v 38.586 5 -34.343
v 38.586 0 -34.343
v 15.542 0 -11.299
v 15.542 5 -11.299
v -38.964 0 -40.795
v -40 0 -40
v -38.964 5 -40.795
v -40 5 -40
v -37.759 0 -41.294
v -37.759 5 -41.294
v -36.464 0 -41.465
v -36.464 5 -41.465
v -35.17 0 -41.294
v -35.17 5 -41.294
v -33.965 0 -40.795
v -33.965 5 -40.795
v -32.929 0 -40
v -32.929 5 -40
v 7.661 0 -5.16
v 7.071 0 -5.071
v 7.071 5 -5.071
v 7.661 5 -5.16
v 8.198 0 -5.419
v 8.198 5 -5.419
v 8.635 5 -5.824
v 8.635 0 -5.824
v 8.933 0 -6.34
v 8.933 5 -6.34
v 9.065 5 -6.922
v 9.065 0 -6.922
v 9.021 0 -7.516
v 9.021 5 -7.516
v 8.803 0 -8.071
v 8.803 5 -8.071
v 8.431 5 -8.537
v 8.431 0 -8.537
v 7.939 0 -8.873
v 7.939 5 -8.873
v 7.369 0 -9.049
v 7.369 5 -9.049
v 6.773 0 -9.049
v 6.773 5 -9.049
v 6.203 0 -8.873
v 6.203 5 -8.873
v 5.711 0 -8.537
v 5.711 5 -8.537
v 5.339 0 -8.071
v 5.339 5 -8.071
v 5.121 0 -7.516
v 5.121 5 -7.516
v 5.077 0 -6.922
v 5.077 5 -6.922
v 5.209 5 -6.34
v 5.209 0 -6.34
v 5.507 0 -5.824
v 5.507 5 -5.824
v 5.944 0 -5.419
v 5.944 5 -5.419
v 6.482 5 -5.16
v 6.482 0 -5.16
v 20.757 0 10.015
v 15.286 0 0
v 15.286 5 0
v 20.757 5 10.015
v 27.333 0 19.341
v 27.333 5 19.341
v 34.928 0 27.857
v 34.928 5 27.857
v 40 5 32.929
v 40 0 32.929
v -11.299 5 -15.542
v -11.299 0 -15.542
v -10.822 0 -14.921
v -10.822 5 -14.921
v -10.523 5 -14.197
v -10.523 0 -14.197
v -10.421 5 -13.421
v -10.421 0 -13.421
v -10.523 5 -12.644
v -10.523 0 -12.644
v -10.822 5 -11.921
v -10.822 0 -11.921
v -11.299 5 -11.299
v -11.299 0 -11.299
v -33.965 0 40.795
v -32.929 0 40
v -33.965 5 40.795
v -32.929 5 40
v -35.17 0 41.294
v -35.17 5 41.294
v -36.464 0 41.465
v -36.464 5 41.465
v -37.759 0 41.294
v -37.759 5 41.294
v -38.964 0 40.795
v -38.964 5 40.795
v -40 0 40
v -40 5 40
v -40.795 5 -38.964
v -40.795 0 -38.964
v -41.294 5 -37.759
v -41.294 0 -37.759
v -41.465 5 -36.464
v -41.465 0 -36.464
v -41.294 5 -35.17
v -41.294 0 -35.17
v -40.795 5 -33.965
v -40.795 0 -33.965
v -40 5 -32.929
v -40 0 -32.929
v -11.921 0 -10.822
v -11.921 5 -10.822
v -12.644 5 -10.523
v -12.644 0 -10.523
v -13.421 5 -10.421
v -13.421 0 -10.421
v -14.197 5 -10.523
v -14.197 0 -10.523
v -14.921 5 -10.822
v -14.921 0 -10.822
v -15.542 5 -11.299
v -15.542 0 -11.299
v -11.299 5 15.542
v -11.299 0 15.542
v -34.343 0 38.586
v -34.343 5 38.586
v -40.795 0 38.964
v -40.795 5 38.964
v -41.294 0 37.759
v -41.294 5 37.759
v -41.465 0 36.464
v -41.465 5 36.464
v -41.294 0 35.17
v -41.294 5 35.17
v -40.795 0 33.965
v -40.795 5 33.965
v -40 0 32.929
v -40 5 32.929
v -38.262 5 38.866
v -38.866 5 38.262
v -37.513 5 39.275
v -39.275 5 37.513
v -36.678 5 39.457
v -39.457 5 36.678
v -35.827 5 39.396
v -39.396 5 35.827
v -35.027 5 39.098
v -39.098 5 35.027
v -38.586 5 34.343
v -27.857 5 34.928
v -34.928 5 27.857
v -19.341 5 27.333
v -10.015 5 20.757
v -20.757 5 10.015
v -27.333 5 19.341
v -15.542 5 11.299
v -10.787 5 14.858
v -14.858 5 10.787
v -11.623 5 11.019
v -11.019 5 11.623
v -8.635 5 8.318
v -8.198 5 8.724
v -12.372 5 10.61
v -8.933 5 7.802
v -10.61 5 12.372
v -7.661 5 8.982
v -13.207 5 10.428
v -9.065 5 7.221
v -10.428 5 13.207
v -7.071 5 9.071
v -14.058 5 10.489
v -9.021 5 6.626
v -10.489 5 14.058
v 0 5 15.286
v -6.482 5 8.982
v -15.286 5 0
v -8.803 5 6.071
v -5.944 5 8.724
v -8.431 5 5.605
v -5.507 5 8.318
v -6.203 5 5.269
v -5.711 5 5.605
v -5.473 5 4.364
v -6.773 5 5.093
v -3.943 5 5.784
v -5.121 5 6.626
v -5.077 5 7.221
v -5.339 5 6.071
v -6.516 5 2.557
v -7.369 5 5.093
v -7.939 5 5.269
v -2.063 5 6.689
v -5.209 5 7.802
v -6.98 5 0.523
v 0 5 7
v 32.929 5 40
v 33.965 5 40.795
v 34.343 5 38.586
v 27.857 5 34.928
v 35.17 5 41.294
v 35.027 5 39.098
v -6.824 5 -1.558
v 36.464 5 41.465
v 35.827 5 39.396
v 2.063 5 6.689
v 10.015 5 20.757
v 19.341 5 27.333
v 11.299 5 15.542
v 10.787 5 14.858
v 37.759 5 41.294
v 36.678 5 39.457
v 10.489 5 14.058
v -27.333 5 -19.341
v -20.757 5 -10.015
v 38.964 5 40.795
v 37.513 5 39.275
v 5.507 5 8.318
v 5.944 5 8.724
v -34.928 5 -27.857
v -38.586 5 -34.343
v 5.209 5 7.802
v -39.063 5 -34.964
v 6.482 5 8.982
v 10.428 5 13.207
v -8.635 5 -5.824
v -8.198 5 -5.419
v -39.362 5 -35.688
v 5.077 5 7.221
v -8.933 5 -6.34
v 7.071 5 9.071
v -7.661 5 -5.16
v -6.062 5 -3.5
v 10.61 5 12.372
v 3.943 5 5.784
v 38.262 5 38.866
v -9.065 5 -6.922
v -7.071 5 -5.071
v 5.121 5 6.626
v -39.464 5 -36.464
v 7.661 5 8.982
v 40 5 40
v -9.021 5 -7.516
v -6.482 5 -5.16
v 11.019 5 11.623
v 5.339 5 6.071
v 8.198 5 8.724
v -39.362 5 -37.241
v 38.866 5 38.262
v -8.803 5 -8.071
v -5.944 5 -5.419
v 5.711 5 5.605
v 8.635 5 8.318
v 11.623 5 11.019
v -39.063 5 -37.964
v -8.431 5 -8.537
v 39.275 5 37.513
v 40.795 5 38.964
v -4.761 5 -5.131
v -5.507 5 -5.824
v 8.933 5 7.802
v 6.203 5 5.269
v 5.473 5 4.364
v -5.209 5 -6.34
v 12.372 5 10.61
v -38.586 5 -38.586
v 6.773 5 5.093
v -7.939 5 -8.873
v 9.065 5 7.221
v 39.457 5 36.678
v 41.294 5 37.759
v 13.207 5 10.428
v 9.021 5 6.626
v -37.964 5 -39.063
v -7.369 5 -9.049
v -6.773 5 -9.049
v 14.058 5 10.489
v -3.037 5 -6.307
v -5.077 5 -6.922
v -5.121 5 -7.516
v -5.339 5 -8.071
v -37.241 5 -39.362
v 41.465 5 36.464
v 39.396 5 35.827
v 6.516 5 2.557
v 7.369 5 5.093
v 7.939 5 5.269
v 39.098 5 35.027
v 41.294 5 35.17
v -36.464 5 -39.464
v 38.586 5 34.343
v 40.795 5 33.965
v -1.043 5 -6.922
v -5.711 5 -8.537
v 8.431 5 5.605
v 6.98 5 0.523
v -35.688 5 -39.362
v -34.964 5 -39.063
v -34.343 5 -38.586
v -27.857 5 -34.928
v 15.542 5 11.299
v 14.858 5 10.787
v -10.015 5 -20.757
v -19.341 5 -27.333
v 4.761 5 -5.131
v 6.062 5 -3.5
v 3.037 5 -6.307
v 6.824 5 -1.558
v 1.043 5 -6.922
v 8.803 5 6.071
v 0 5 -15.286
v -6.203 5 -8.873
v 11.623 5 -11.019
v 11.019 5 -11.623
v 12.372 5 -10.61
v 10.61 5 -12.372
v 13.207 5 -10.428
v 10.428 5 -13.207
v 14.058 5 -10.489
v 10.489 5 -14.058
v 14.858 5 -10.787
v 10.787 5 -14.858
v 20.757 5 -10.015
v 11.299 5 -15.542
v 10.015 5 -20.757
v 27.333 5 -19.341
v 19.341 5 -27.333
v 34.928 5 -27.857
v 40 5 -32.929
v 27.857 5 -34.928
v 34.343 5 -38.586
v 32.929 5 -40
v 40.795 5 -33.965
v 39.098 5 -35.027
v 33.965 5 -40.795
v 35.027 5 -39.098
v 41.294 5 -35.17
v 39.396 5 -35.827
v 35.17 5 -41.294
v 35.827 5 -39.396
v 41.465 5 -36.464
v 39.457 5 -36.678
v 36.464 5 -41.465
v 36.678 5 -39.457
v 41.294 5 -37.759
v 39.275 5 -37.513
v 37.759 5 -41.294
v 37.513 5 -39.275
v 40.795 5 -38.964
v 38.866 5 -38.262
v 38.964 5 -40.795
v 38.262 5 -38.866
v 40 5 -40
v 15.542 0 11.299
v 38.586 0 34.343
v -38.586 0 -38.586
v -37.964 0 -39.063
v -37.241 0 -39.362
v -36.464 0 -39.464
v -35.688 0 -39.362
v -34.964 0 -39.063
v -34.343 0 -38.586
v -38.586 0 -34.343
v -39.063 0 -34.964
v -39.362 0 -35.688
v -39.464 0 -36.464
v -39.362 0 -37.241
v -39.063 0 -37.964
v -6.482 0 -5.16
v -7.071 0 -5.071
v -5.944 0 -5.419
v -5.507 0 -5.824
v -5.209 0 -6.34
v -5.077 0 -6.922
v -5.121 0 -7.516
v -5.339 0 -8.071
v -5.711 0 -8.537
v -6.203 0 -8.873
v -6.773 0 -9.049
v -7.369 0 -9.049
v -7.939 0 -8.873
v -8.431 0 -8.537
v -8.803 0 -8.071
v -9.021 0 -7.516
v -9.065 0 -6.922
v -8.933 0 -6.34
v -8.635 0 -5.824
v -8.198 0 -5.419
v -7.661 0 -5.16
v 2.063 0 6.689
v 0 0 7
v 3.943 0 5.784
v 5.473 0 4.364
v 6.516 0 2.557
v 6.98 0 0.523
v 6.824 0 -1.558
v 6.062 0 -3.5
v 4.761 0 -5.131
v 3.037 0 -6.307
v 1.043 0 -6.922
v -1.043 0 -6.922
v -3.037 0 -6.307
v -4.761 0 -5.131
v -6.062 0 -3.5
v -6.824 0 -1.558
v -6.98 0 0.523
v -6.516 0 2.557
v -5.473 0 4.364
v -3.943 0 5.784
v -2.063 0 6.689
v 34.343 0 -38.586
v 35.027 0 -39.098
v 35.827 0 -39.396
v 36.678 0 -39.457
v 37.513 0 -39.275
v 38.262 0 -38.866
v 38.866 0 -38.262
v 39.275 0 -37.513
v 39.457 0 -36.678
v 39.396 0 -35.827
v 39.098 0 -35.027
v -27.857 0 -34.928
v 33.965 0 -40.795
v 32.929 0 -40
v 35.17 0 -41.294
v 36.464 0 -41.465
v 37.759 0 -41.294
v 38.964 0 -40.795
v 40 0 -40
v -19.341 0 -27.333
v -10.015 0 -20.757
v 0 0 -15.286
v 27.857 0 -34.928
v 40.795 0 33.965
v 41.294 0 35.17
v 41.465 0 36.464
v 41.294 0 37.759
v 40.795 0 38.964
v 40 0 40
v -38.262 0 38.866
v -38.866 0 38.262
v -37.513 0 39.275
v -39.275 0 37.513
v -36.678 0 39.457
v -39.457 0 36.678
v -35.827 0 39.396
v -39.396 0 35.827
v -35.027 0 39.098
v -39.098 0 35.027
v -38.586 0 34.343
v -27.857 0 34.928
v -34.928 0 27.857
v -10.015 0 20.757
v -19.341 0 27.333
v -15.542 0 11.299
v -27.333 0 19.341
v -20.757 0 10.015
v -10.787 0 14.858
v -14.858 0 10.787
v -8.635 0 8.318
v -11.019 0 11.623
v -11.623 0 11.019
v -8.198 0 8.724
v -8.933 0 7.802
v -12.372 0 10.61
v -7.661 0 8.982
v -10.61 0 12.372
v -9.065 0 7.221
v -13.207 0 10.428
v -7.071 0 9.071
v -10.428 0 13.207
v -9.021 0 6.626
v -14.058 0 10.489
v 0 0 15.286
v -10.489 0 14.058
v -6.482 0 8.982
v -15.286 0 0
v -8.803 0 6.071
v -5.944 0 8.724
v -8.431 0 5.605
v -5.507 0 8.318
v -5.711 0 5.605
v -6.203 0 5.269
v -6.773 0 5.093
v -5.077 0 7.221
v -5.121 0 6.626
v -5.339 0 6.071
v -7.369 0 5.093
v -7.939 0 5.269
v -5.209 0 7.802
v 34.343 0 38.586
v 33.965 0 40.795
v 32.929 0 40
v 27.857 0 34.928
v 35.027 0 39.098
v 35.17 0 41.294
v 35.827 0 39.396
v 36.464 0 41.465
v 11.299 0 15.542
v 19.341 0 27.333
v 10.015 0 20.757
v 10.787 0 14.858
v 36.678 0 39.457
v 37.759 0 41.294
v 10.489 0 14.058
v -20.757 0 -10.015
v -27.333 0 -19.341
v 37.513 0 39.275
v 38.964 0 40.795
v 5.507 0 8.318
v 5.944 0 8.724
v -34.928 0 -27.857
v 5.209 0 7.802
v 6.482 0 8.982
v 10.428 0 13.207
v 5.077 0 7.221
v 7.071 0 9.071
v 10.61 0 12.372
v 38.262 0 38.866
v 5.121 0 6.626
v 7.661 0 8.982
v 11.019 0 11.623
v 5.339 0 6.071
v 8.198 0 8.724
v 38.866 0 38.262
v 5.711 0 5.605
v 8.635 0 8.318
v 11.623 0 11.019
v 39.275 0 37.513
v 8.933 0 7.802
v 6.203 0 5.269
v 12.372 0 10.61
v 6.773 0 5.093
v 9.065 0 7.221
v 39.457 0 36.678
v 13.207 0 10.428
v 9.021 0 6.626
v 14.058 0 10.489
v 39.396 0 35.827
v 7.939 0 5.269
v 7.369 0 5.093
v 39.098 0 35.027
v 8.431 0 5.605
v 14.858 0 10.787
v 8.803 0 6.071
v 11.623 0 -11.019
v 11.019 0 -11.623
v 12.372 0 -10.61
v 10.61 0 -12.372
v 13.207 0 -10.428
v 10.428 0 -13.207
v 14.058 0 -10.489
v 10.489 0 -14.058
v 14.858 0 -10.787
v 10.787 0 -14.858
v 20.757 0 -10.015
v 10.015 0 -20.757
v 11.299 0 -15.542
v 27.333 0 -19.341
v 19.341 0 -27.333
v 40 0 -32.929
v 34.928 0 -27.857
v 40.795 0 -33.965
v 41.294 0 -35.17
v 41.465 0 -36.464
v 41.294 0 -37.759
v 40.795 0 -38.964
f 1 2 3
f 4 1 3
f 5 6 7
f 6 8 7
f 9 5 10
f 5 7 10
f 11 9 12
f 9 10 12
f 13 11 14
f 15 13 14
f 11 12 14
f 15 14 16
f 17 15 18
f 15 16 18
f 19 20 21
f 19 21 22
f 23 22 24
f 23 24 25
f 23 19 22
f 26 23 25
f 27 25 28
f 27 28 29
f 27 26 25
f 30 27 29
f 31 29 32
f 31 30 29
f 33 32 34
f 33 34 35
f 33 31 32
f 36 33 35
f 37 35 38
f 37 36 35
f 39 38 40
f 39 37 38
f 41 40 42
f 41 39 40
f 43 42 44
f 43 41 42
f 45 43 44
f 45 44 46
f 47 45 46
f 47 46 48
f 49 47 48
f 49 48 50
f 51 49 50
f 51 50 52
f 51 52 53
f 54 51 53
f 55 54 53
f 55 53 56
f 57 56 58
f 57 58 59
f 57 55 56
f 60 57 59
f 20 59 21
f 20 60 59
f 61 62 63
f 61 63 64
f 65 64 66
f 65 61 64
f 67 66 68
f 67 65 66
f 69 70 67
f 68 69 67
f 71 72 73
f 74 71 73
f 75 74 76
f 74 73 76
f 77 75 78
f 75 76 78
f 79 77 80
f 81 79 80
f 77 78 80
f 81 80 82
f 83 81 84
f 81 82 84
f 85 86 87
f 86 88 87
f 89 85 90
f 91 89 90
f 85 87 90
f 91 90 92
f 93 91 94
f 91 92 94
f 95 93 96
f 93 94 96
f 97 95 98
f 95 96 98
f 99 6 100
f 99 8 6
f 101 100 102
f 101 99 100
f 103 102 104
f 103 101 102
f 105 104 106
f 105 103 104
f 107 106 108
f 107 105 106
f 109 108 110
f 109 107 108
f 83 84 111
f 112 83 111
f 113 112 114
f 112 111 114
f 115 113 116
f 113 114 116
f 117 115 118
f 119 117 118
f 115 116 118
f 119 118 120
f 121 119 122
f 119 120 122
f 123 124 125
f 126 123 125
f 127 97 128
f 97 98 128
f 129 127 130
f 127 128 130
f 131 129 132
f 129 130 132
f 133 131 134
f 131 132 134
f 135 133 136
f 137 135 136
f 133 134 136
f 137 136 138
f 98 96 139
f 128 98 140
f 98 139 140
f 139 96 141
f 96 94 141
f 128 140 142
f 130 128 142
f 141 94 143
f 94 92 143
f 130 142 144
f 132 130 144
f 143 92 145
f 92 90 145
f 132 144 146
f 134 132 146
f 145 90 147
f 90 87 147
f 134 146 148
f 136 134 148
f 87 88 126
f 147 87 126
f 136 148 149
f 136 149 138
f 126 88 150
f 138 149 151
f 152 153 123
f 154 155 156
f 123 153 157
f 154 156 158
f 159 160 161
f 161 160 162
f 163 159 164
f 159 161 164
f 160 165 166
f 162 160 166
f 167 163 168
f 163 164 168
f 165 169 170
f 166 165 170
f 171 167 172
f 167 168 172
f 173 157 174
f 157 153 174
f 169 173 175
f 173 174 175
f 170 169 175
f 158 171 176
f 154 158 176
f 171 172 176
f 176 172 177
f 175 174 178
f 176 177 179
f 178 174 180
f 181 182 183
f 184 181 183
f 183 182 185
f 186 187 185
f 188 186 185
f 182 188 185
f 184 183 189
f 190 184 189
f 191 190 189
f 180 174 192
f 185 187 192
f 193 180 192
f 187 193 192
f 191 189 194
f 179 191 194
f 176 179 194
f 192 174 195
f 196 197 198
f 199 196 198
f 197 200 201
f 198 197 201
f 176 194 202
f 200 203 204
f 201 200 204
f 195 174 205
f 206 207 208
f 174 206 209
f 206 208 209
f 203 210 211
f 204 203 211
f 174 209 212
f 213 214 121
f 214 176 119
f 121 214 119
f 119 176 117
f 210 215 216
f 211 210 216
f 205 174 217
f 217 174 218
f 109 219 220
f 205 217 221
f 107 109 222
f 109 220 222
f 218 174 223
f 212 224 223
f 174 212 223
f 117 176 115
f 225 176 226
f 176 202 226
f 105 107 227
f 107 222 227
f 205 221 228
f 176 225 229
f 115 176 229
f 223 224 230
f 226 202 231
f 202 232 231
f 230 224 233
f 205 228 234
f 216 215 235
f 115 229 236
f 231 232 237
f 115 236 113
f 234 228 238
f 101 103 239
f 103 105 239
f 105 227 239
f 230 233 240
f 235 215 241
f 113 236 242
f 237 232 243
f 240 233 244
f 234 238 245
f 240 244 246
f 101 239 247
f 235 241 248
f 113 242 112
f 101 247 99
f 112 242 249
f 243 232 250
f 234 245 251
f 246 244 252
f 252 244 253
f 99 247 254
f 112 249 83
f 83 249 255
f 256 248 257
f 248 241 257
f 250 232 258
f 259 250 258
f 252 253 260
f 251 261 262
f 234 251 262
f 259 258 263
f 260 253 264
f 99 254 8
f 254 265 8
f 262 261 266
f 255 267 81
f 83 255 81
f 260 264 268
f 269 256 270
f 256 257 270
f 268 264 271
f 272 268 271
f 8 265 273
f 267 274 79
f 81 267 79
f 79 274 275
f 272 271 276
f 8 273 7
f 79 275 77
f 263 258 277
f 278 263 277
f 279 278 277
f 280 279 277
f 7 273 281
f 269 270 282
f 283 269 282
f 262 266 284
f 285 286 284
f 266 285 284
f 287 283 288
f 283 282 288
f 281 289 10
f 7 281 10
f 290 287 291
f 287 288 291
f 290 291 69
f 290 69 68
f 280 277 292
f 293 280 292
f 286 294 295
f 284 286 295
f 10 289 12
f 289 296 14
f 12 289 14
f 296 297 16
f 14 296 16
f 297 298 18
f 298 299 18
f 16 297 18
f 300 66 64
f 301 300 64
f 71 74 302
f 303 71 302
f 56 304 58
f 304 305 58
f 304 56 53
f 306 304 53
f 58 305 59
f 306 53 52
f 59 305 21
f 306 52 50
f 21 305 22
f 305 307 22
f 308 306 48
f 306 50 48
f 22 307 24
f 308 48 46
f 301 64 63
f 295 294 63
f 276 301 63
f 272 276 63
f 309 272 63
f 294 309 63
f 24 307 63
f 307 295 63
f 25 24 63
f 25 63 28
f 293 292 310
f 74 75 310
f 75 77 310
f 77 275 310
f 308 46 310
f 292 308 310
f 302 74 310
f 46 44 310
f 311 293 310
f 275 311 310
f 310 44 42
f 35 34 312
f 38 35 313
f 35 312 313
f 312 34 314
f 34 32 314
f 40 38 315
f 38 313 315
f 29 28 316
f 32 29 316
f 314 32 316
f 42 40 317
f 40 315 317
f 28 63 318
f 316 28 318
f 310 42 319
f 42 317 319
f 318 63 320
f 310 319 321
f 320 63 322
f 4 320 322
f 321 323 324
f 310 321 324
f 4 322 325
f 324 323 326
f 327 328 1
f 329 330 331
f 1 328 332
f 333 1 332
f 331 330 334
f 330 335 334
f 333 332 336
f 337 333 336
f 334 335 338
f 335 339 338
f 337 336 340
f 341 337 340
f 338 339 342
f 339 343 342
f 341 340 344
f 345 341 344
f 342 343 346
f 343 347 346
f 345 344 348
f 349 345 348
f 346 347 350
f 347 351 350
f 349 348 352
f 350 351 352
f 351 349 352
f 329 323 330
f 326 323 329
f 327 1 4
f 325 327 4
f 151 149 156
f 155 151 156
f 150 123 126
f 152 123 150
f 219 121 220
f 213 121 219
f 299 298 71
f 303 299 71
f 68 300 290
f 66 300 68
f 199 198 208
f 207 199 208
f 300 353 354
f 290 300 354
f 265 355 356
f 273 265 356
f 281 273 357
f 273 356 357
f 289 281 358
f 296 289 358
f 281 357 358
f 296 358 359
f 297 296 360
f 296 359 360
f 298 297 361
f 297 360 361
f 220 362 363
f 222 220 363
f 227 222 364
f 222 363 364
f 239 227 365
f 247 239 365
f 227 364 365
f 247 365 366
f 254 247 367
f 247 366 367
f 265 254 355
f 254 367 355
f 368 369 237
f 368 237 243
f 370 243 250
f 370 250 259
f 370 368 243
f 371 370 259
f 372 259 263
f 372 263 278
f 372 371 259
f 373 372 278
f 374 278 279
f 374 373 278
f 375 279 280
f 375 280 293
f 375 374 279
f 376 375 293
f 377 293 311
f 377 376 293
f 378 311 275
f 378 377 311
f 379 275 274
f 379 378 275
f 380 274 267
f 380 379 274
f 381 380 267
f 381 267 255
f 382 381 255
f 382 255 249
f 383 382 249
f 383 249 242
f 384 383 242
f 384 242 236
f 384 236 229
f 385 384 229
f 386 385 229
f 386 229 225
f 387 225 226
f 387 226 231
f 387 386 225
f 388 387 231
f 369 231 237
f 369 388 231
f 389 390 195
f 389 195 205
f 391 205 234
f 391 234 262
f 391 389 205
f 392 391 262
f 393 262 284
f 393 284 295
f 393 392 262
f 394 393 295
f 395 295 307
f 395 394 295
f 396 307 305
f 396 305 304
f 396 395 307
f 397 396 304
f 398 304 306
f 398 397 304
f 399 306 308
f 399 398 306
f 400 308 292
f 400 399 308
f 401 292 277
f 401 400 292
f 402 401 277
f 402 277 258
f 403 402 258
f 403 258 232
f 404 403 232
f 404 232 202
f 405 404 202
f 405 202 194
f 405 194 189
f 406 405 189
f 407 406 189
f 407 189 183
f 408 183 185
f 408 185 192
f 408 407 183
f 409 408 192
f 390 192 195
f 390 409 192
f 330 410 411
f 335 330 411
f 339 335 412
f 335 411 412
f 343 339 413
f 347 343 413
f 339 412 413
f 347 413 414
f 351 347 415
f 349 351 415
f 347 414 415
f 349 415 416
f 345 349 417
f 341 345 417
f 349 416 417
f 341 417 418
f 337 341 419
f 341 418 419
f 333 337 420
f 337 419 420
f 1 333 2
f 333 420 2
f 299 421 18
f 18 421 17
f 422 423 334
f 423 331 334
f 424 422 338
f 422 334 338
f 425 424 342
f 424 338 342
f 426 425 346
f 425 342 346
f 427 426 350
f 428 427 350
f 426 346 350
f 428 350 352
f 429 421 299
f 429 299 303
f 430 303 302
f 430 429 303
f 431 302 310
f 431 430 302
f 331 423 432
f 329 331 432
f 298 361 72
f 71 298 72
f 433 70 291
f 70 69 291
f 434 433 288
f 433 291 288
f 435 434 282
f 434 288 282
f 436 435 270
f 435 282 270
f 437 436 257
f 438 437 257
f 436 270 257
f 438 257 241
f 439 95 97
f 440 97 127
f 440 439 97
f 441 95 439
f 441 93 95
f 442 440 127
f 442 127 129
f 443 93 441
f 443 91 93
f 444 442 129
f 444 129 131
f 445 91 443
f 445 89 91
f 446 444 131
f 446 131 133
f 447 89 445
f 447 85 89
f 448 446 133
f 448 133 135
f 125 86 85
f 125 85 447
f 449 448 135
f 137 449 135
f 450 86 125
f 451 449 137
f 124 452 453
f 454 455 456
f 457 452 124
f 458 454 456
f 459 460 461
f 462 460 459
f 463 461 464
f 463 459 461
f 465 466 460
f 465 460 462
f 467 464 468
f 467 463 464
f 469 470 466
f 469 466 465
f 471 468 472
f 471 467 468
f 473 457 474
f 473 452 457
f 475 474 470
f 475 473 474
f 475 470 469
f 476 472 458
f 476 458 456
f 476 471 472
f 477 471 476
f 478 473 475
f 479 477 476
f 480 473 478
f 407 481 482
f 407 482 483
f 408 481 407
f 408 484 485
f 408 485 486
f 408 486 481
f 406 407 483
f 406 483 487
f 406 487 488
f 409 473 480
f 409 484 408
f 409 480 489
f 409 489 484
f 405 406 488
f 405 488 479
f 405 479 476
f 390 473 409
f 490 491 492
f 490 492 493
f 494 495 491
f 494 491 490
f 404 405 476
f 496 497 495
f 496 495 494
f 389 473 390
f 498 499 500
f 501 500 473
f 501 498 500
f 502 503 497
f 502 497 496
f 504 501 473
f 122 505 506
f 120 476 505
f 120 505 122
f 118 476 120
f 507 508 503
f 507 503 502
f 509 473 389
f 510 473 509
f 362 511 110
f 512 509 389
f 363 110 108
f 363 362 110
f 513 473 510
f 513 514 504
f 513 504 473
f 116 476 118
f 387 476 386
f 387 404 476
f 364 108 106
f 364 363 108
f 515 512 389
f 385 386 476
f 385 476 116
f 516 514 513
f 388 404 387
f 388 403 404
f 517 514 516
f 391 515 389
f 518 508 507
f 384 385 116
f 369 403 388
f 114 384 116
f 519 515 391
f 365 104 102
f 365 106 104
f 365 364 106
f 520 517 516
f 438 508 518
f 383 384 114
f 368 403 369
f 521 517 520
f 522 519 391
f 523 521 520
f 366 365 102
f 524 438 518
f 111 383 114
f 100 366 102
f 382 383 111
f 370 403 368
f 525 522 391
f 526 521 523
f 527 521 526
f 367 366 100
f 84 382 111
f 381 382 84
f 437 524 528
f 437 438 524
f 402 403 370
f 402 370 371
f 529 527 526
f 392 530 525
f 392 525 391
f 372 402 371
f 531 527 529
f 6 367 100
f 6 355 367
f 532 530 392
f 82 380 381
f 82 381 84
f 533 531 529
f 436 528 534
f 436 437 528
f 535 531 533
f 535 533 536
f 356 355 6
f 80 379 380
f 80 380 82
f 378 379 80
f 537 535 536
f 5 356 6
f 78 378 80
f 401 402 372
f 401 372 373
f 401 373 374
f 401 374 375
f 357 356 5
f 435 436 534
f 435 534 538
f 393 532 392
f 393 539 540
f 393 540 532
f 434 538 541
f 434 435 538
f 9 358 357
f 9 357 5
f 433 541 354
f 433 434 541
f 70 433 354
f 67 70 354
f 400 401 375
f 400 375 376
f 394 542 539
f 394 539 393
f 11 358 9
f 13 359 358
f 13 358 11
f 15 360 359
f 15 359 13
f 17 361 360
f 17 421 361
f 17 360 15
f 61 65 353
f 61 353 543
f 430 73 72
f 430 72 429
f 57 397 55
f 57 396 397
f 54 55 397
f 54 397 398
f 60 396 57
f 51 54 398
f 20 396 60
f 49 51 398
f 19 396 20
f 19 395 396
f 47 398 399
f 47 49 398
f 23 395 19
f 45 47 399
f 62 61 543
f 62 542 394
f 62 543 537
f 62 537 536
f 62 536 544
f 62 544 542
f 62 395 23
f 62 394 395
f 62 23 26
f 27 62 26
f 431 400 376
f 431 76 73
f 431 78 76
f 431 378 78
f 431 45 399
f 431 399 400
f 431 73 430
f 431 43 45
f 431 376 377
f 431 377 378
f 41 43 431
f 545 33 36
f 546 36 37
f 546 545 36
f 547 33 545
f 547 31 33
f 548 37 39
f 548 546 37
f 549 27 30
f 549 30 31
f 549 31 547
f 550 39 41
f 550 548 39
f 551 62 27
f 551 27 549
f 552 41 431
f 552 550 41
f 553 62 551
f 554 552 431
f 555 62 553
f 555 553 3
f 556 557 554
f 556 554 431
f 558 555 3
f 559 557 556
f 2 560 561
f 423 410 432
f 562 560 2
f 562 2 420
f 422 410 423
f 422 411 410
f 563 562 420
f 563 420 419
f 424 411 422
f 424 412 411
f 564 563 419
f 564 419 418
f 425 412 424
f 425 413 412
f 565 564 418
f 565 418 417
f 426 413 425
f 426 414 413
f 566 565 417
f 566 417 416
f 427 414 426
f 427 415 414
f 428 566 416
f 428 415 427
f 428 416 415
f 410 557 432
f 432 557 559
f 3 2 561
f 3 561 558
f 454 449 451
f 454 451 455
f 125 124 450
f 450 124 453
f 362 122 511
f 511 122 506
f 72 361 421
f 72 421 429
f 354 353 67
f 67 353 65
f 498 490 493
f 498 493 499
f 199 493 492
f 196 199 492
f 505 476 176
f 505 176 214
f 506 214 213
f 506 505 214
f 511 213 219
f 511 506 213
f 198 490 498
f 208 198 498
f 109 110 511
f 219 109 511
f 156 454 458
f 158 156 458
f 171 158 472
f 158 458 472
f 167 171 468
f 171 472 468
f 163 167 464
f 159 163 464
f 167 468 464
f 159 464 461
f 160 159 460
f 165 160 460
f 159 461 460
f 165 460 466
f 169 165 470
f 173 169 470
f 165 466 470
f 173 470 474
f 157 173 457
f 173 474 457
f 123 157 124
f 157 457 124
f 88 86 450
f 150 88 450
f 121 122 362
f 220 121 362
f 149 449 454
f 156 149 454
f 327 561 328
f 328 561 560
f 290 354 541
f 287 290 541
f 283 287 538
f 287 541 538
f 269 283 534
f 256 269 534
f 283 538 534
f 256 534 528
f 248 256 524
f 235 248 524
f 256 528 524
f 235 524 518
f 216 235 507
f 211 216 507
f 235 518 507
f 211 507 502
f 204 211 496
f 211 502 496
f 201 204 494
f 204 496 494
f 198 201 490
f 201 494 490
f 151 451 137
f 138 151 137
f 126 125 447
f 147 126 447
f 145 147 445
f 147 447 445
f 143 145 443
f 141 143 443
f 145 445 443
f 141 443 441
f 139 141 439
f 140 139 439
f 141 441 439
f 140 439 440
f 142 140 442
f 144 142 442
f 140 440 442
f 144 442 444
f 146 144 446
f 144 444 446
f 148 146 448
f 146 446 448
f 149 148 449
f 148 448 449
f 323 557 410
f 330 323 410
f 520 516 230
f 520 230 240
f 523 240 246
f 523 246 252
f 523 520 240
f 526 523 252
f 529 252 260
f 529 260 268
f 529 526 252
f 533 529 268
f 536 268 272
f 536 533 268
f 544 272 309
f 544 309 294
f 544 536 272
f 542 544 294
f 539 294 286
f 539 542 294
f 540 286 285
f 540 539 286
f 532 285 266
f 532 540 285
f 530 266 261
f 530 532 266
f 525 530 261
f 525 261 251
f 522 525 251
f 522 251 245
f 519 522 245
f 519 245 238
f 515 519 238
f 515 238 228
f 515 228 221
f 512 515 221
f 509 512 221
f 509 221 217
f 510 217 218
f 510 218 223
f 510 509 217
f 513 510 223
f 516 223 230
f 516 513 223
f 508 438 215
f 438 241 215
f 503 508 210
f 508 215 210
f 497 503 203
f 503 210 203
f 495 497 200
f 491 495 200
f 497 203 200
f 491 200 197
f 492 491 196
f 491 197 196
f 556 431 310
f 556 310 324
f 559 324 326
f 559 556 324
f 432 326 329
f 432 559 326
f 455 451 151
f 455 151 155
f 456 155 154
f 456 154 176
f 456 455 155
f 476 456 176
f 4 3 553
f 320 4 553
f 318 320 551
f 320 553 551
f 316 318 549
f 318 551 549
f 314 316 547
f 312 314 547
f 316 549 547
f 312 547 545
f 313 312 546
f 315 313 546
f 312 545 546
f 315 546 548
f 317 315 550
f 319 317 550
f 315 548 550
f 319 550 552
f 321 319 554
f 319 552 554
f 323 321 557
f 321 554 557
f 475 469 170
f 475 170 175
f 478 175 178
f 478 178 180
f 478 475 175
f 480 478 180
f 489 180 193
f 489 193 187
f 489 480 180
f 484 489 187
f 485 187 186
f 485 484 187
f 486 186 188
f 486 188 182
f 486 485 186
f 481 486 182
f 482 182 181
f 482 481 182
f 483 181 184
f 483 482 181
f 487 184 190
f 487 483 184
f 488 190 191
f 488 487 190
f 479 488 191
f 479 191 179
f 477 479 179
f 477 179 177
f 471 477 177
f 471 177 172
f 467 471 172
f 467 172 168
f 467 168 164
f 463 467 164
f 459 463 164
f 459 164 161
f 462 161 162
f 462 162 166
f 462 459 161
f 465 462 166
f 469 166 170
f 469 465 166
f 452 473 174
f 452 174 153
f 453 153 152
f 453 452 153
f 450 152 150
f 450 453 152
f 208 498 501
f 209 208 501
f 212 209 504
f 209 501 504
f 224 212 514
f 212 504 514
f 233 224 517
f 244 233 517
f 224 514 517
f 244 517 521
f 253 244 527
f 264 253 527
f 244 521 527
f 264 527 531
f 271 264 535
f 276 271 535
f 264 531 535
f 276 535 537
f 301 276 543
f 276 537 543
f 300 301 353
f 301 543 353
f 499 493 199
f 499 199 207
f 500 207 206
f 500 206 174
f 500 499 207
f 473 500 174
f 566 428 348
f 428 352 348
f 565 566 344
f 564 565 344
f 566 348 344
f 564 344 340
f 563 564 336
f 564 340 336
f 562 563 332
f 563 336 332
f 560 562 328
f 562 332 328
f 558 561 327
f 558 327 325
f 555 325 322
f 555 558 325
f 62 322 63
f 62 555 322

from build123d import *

# Parameters (mm, degrees)
SKETCH1_R           = 14
SKETCH1_R_2         = 2
SKETCH1_R_3         = 7
BOSS_EXTRUDE1_DEPTH = 5
BOSS_EXTRUDE3_START = -5
BOSS_EXTRUDE3_DEPTH = 5
FILLET1_R           = 5
FILLET2_R           = 100


# Some blends are built 0.0001 mm under size
with BuildPart() as part:
    # Sketch1 → Boss-Extrude1 (new body)
    with BuildSketch(Plane(origin=(0, 0, 0), x_dir=(1, 0, 0), z_dir=(0, 1, 0))):
        with Locations(Location((0, 0, 0), (0, 0, 270))):
            Circle(SKETCH1_R)
        with Locations(Location((7.071067812, 7.071067812, 0), (0, 0, 270))):
            Circle(SKETCH1_R_2, mode=Mode.SUBTRACT)
        with Locations(Location((7.071067812, -7.071067812, 0), (0, 0, 270))):
            Circle(SKETCH1_R_2, mode=Mode.SUBTRACT)
        with Locations(Location((-7.071067812, -7.071067812, 0), (0, 0, 270))):
            Circle(SKETCH1_R_2, mode=Mode.SUBTRACT)
        with Locations(Location((-7.071067812, 7.071067812, 0), (0, 0, 270))):
            Circle(SKETCH1_R_2, mode=Mode.SUBTRACT)
        with Locations(Location((0, 0, 0), (0, 0, 270))):
            Circle(SKETCH1_R_3, mode=Mode.SUBTRACT)
    extrude(amount=BOSS_EXTRUDE1_DEPTH)

    # Sketch4 → Boss-Extrude3 (add)
    # profile 1 of 7: a face of its own
    with BuildSketch(Plane(origin=(0, 5, 0), x_dir=(1, 0, 0), z_dir=(0, 1, 0)).offset(BOSS_EXTRUDE3_START)):
        with BuildLine():
            ThreePointArc((-5.711087099, -12.78215491), (-7.937253933, -11.532562595), (-9.899494937, -9.899494937))
            ThreePointArc((-9.899494937, -9.899494937), (-11.532562595, -7.937253933), (-12.78215491, -5.711087099))
            Line((-12.78215491, -5.711087099), (-43.535533906, -36.464466094))
            Line((-43.535533906, -36.464466094), (-36.464466094, -43.535533906))
            Line((-36.464466094, -43.535533906), (-5.711087099, -12.78215491))
        make_face()
        with BuildLine():
            ThreePointArc((-15.541841567, -11.29920088), (-11.29920088, -11.29920088), (-11.29920088, -15.541841567))
            Line((-11.29920088, -15.541841567), (-34.343145751, -38.585786438))
            ThreePointArc((-34.343145751, -38.585786438), (-38.585786438, -38.585786438), (-38.585786438, -34.343145751))
            Line((-38.585786438, -34.343145751), (-15.541841567, -11.29920088))
        make_face(mode=Mode.SUBTRACT)
    # profile 2 of 7: a face of its own
    with BuildSketch(Plane(origin=(0, 5, 0), x_dir=(1, 0, 0), z_dir=(0, 1, 0)).offset(BOSS_EXTRUDE3_START)):
        with BuildLine():
            ThreePointArc((-10.420735139, 9.349239497), (-10.163839474, 9.627895261), (-9.899494937, 9.899494937))
            Line((-9.899494937, 9.899494937), (-11.29920088, 11.29920088))
            ThreePointArc((-11.29920088, 11.29920088), (-13.420521224, 10.420521224), (-15.541841567, 11.29920088))
            Line((-15.541841567, 11.29920088), (-38.585786438, 34.343145751))
            ThreePointArc((-38.585786438, 34.343145751), (-39.464466094, 36.464466094), (-38.585786438, 38.585786438))
            Line((-38.585786438, 38.585786438), (-40, 40))
            Line((-40, 40), (-43.535533906, 36.464466094))
            Line((-43.535533906, 36.464466094), (-13.420521224, 6.349453412))
            Line((-13.420521224, 6.349453412), (-10.420735139, 9.349239497))
        make_face()
    # profile 3 of 7: a face of its own
    with BuildSketch(Plane(origin=(0, 5, 0), x_dir=(1, 0, 0), z_dir=(0, 1, 0)).offset(BOSS_EXTRUDE3_START)):
        with BuildLine():
            ThreePointArc((-12.78215491, 5.711087099), (-11.743192278, 7.622167351), (-10.420735139, 9.349239497))
            Line((-10.420735139, 9.349239497), (-13.420521224, 6.349453412))
            Line((-13.420521224, 6.349453412), (-12.78215491, 5.711087099))
        make_face()
    # profile 4 of 7: a face of its own
    with BuildSketch(Plane(origin=(0, 5, 0), x_dir=(1, 0, 0), z_dir=(0, 1, 0)).offset(BOSS_EXTRUDE3_START)):
        with BuildLine():
            Line((-11.29920088, 11.29920088), (-9.899494937, 9.899494937))
            ThreePointArc((-9.899494937, 9.899494937), (-9.627895261, 10.163839474), (-9.349239497, 10.420735139))
            Line((-9.349239497, 10.420735139), (-6.349453412, 13.420521224))
            Line((-6.349453412, 13.420521224), (-36.464466094, 43.535533906))
            Line((-36.464466094, 43.535533906), (-40, 40))
            Line((-40, 40), (-38.585786438, 38.585786438))
            ThreePointArc((-38.585786438, 38.585786438), (-36.464466094, 39.464466094), (-34.343145751, 38.585786438))
            Line((-34.343145751, 38.585786438), (-11.29920088, 15.541841567))
            ThreePointArc((-11.29920088, 15.541841567), (-10.420521224, 13.420521224), (-11.29920088, 11.29920088))
        make_face()
    # profile 5 of 7: a face of its own
    with BuildSketch(Plane(origin=(0, 5, 0), x_dir=(1, 0, 0), z_dir=(0, 1, 0)).offset(BOSS_EXTRUDE3_START)):
        with BuildLine():
            Line((-6.349453412, 13.420521224), (-9.349239497, 10.420735139))
            ThreePointArc((-9.349239497, 10.420735139), (-7.622167351, 11.743192278), (-5.711087099, 12.78215491))
            Line((-5.711087099, 12.78215491), (-6.349453412, 13.420521224))
        make_face()
    # profile 6 of 7: a face of its own
    with BuildSketch(Plane(origin=(0, 5, 0), x_dir=(1, 0, 0), z_dir=(0, 1, 0)).offset(BOSS_EXTRUDE3_START)):
        with BuildLine():
            ThreePointArc((5.711087099, 12.78215491), (7.937253933, 11.532562595), (9.899494937, 9.899494937))
            ThreePointArc((9.899494937, 9.899494937), (11.532562595, 7.937253933), (12.78215491, 5.711087099))
            Line((12.78215491, 5.711087099), (43.535533906, 36.464466094))
            Line((43.535533906, 36.464466094), (36.464466094, 43.535533906))
            Line((36.464466094, 43.535533906), (5.711087099, 12.78215491))
        make_face()
        with BuildLine():
            ThreePointArc((15.541841567, 11.29920088), (11.29920088, 11.29920088), (11.29920088, 15.541841567))
            Line((11.29920088, 15.541841567), (34.343145751, 38.585786438))
            ThreePointArc((34.343145751, 38.585786438), (38.585786438, 38.585786438), (38.585786438, 34.343145751))
            Line((38.585786438, 34.343145751), (15.541841567, 11.29920088))
        make_face(mode=Mode.SUBTRACT)
    # profile 7 of 7: a face of its own
    with BuildSketch(Plane(origin=(0, 5, 0), x_dir=(1, 0, 0), z_dir=(0, 1, 0)).offset(BOSS_EXTRUDE3_START)):
        with BuildLine():
            ThreePointArc((12.78215491, -5.711087099), (11.532562595, -7.937253933), (9.899494937, -9.899494937))
            ThreePointArc((9.899494937, -9.899494937), (7.937253933, -11.532562595), (5.711087099, -12.78215491))
            Line((5.711087099, -12.78215491), (36.464466094, -43.535533906))
            Line((36.464466094, -43.535533906), (43.535533906, -36.464466094))
            Line((43.535533906, -36.464466094), (12.78215491, -5.711087099))
        make_face()
        with BuildLine():
            ThreePointArc((11.29920088, -15.541841567), (11.29920088, -11.29920088), (15.541841567, -11.29920088))
            Line((15.541841567, -11.29920088), (38.585786438, -34.343145751))
            ThreePointArc((38.585786438, -34.343145751), (38.585786438, -38.585786438), (34.343145751, -38.585786438))
            Line((34.343145751, -38.585786438), (11.29920088, -15.541841567))
        make_face(mode=Mode.SUBTRACT)
    extrude(amount=BOSS_EXTRUDE3_DEPTH)

    # Fillet1
    fillet1_edges = [part.edges().sort_by_distance(p)[0] for p in [
        (-36.464466094, 2.5, 43.535533906),
        (-43.535533906, 2.5, 36.464466094),
        (-43.535533906, 2.5, -36.464466094),
        (-36.464466094, 2.5, -43.535533906),
        (36.464466094, 2.5, -43.535533906),
        (43.535533906, 2.5, -36.464466094),
        (36.464466094, 2.5, 43.535533906),
        (43.535533906, 2.5, 36.464466094),
    ]]
    fillet(fillet1_edges, radius=FILLET1_R - 0.0001)  # a hair under: the kernel refuses the full size

    # Fillet2
    # the kernel refuses this fillet: 100 mm, written as the material it adds along each edge
    with BuildSketch(Plane(origin=(-5.711087099, 0, 12.78215491), x_dir=(0.9998484998051017, 0, 0.017406247082228966), z_dir=(0, 1, 0)), Plane(origin=(-12.78215491, 0, -5.711087099), x_dir=(-0.017406247082221098, 0, 0.9998484998051018), z_dir=(0, 1, 0))) as fillet2_piece_1:
        with BuildLine():
            CenterArc((50.173554479, -91.997335747), FILLET2_R, 113.07781271, 22.919542152)
            Line((-21.757218493, -22.528177844), (0, 0))
            ThreePointArc((0, 0), (5.487732521, -1.120372995), (10.975465042, 0))
        make_face()
    extrude(amount=5)
    with BuildSketch(Plane(origin=(5.711087099, 0, 12.78215491), x_dir=(0.7071067811865421, 0, 0.7071067811865529), z_dir=(0, 1, 0)), Plane(origin=(-12.78215491, 0, 5.711087099), x_dir=(-0.7071067811865551, 0, 0.7071067811865399), z_dir=(0, 1, 0))) as fillet2_piece_2:
        with BuildLine():
            CenterArc((31.31924893, -100), FILLET2_R, 90, 22.919542152)
            ThreePointArc((-7.624563141, -7.894736842), (-3.006388615, -4.725682106), (0, 0))
            Line((0, 0), (31.31924893, 0))
        make_face()
    extrude(amount=5)
    with BuildSketch(Plane(origin=(12.78215491, 0, 5.711087099), x_dir=(0.7071067811865436, 0, 0.7071067811865516), z_dir=(0, 1, 0)), Plane(origin=(5.711087099, 0, -12.78215491), x_dir=(0.7071067811865498, 0, -0.7071067811865454), z_dir=(0, 1, 0))) as fillet2_piece_3:
        with BuildLine():
            CenterArc((31.31924893, 100), FILLET2_R, 247.080457848, 22.919542152)
            ThreePointArc((-7.624563141, 7.894736842), (-3.006388615, 4.725682106), (0, 0))
            Line((0, 0), (31.31924893, 0))
        make_face()
    extrude(amount=5)
    with BuildSketch(Plane(origin=(12.78215491, 0, -5.711087099), x_dir=(0.01740624708221406, 0, 0.9998484998051019), z_dir=(0, 1, 0)), Plane(origin=(-5.711087099, 0, -12.78215491), x_dir=(0.9998484998051018, 0, -0.017406247082221094), z_dir=(0, 1, 0))) as fillet2_piece_4:
        with BuildLine():
            CenterArc((50.173554479, 91.997335747), FILLET2_R, 224.002645138, 22.919542152)
            Line((-21.757218493, 22.528177844), (0, 0))
            ThreePointArc((0, 0), (5.487732521, 1.120372995), (10.975465042, 0))
        make_face()
    extrude(amount=5)


solid = part.part
